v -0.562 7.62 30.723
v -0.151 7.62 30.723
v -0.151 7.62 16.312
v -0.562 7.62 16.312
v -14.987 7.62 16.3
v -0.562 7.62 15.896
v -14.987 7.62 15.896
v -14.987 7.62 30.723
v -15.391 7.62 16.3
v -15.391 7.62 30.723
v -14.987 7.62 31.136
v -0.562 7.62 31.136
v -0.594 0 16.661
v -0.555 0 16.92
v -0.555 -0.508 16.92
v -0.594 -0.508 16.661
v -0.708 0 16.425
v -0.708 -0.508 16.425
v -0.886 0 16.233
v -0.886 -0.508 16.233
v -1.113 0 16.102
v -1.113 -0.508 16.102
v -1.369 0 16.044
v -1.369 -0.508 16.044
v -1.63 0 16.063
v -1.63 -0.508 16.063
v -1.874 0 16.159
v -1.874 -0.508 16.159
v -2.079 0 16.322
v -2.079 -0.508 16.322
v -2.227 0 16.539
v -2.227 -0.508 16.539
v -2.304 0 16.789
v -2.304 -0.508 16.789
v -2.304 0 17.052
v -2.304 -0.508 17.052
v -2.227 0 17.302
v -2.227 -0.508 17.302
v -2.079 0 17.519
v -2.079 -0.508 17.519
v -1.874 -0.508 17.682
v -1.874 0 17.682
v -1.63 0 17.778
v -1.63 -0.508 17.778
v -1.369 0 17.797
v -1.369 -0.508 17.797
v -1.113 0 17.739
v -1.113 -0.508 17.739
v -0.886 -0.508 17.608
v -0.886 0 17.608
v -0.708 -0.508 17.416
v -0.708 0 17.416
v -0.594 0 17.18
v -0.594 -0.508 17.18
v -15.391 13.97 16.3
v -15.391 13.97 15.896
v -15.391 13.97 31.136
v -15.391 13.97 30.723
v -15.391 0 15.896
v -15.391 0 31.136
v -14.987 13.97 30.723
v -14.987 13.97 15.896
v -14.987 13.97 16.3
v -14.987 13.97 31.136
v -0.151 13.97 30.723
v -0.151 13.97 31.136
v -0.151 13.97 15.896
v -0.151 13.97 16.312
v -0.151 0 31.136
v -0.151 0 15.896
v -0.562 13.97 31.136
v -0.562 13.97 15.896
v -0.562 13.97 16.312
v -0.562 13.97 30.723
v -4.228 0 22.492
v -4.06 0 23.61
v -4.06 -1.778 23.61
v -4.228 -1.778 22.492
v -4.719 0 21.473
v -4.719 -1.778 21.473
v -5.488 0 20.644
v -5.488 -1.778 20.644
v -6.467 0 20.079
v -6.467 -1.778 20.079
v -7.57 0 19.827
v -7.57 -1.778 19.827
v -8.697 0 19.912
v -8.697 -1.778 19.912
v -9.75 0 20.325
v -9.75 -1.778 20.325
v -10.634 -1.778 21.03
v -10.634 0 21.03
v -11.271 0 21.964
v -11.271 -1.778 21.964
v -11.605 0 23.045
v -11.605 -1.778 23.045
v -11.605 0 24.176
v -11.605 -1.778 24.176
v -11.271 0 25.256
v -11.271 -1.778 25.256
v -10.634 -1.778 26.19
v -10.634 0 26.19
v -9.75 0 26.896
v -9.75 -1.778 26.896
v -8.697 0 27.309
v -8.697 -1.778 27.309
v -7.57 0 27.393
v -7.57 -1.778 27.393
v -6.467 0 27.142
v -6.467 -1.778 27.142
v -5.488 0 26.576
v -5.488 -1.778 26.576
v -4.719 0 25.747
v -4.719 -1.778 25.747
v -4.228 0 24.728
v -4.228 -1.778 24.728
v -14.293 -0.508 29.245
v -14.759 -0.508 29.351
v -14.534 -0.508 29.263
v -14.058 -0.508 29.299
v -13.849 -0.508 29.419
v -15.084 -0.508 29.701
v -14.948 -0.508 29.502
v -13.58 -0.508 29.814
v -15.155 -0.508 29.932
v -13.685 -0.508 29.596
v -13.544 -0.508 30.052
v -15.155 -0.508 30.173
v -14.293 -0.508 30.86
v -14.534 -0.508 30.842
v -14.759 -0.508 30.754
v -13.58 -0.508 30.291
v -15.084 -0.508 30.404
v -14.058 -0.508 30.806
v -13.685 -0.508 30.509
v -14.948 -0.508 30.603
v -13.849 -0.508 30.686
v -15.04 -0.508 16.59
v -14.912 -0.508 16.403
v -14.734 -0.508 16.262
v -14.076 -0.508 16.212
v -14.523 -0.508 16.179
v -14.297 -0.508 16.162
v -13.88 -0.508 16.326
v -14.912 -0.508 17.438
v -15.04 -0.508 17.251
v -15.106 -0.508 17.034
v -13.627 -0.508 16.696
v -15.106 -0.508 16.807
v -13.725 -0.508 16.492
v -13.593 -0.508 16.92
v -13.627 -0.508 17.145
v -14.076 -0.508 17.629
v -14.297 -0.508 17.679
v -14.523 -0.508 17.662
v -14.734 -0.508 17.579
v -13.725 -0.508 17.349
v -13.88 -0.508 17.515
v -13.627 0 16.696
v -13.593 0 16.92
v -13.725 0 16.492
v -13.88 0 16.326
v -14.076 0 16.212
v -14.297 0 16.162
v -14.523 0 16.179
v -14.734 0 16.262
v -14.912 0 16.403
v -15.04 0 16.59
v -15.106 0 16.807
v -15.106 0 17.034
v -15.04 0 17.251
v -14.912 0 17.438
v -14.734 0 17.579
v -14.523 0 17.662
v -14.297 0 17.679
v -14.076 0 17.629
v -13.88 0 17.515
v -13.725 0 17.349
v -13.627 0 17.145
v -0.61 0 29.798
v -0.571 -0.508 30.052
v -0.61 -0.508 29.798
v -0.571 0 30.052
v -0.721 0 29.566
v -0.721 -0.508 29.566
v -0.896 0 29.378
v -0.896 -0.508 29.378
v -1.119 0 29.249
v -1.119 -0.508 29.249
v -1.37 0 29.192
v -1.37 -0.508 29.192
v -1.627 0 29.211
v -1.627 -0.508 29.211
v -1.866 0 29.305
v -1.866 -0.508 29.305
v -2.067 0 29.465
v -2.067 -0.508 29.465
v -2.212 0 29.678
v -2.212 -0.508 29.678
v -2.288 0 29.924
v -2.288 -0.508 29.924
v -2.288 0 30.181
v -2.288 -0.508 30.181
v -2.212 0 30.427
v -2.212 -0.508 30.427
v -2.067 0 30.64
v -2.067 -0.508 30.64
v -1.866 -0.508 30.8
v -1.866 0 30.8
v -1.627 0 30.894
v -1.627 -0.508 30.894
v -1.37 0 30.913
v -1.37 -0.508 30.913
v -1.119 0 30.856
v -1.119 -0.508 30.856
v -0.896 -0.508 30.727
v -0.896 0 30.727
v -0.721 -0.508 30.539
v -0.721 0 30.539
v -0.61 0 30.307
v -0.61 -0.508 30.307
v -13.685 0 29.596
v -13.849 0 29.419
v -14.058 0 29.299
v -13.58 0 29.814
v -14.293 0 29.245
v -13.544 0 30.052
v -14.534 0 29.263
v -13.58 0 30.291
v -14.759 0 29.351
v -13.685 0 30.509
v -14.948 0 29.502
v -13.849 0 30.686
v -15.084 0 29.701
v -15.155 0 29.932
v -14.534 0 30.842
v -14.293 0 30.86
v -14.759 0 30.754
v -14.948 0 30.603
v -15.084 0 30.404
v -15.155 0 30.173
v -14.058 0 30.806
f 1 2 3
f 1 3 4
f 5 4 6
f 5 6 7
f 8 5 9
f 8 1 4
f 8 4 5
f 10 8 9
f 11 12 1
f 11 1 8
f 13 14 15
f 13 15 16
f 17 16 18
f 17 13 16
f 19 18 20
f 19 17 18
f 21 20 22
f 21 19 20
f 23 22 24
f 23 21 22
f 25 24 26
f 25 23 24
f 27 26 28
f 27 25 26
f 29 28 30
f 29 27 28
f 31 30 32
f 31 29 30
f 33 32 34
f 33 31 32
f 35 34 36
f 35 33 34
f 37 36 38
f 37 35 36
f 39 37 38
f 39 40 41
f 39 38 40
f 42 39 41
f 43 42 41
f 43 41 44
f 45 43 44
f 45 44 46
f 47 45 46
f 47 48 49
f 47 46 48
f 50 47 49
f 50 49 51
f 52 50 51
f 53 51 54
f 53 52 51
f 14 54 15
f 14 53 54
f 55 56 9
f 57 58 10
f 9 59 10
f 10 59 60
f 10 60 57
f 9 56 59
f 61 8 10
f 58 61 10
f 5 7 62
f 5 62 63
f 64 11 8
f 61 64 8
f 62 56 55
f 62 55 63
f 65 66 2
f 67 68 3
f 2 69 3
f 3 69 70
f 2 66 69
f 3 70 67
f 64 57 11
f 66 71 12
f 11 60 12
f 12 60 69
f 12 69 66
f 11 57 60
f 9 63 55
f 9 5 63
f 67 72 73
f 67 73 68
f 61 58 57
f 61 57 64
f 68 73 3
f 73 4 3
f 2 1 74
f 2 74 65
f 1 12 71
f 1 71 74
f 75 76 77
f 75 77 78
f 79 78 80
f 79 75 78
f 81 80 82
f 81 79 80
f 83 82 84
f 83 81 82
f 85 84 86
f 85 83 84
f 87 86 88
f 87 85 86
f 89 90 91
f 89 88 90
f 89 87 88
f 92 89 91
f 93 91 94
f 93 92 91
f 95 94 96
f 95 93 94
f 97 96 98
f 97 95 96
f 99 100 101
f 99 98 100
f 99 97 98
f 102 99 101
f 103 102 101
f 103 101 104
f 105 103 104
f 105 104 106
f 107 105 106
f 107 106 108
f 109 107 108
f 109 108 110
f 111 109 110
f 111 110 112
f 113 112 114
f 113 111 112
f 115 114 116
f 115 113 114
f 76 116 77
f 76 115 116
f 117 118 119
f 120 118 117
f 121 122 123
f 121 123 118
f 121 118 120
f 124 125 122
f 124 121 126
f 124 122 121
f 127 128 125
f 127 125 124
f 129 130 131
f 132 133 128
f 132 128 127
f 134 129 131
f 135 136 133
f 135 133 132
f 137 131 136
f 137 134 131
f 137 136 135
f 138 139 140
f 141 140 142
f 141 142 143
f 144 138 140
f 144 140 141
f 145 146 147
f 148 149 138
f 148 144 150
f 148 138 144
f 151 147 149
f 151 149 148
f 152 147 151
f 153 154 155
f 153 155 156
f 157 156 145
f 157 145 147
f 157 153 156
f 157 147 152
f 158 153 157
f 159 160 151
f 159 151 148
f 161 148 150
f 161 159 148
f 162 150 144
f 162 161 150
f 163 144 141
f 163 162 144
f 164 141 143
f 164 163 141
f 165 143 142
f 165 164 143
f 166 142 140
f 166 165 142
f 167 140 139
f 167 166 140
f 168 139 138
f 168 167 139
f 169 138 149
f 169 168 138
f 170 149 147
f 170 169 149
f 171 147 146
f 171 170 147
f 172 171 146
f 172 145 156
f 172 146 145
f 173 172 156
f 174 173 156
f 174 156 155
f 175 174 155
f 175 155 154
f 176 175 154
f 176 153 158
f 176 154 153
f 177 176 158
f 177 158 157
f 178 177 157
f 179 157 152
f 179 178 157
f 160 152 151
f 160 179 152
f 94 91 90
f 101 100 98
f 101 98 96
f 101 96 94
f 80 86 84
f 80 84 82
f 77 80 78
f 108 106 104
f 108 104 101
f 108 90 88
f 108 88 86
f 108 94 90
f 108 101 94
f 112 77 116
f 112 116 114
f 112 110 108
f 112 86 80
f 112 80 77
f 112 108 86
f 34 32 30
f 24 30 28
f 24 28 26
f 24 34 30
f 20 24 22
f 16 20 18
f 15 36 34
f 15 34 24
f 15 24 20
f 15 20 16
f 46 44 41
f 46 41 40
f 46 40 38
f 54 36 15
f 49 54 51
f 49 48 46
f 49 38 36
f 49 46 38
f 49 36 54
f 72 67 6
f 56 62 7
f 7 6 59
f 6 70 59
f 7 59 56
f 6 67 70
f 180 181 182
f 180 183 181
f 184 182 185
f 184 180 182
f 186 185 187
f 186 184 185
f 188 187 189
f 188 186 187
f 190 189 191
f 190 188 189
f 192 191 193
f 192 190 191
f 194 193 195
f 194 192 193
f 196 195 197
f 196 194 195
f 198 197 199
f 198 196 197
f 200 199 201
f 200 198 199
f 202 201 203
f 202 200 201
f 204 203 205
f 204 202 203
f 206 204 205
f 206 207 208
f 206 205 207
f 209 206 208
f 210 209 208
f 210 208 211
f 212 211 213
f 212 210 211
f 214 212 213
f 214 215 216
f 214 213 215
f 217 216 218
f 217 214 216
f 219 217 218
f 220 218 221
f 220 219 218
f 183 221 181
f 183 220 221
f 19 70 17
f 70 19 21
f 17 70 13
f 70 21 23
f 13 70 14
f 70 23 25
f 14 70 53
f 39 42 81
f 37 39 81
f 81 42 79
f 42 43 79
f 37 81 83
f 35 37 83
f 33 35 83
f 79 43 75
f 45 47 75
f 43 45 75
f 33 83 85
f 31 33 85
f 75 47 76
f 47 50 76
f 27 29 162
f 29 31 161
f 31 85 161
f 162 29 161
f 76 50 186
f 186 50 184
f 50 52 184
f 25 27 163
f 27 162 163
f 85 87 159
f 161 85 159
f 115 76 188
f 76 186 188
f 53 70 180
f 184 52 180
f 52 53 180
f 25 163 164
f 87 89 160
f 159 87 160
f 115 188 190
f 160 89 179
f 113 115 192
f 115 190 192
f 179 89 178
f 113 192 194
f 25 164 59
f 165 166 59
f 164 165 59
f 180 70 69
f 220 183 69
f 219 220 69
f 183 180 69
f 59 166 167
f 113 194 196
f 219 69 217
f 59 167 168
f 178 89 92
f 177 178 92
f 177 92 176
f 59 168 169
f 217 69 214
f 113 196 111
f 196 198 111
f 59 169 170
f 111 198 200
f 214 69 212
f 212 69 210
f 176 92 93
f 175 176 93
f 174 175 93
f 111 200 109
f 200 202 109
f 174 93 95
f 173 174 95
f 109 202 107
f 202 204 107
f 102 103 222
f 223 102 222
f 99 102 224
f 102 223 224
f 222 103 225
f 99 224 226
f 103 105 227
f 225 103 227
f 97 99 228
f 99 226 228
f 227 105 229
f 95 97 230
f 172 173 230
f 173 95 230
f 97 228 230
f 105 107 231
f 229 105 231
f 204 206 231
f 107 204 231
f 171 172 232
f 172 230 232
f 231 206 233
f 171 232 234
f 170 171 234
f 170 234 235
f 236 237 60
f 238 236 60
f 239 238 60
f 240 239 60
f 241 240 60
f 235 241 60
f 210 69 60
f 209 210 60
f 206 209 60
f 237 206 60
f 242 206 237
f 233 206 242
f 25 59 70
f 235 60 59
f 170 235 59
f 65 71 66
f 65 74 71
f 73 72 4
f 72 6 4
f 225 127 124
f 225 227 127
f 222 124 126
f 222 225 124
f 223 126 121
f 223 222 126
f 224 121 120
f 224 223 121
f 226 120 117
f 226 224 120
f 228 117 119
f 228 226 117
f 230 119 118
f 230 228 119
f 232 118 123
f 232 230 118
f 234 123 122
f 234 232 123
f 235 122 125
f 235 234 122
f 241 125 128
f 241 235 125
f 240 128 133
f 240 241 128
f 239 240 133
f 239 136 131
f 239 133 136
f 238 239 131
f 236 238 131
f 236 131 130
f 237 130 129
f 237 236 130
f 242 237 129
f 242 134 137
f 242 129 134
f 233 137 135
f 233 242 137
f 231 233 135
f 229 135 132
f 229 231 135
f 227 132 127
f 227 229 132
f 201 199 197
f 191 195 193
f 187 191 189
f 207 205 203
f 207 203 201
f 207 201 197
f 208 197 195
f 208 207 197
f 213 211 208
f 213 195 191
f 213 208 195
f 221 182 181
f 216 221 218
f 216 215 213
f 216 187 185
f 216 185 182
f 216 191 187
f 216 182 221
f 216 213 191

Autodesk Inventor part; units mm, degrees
ref_plane "YZ Plane" through (0, 0, 0) normal (1, 0, 0) x (0, 1, 0)
ref_plane "XZ Plane" through (0, 0, 0) normal (0, 1, 0) x (-1, 0, 0)
ref_plane "XY Plane" through (0, 0, 0) normal (0, 0, 1) x (1, 0, 0)
sketch "Sketch1" plane through (0, 0, 0) normal (0, 1, 0) x (-1, 0, 0)
  line L0 (15.3914, 31.136) -> (0.1514, 31.136)
  line L1 (0.1514, 31.136) -> (0.1514, 15.896)
  line L2 (0.1514, 15.896) -> (15.3914, 15.896)
  line L3 (15.3914, 15.896) -> (15.3914, 31.136)
  point P0 (0, 0)
  dimension "d0" = 15.24
  dimension "d1" = 15.24
extrude "Extrusion1" add sketch "Sketch1" along normal blind 7.62
sketch "Sketch2" plane through (0, 0, 0) normal (0, -1, 0) x (1, 0, 0)
  circle A0 centre (-7.8533, 23.6101) radius 3.7937
  point P0 (0, 0)
extrude "Extrusion2" add sketch "Sketch2" along normal blind 1.778
sketch "Sketch3" plane through (0, 0, 0) normal (0, -1, 0) x (1, 0, 0)
  circle A0 centre (-1.4346, 30.0524) radius 0.8632
  circle A1 centre (-1.4346, 16.9205) radius 0.8792
  circle A2 centre (-14.354, 30.0524) radius 0.8098
  circle A3 centre (-14.354, 16.9205) radius 0.7609
  point P0 (0, 0)
extrude "Extrusion3" add sketch "Sketch3" along normal blind 0.508
sketch "Sketch4" plane through (0, 7.62, 0) normal (0, 1, 0) x (1, 0, 0)
  line L0 (-15.3914, -15.896) -> (-15.3914, -31.136) projected
  line L1 (-15.3914, -31.136) -> (-14.9868, -31.136)
  line L2 (-14.9868, -31.136) -> (-14.9868, -30.723)
  line L3 (-14.9868, -30.723) -> (-15.3914, -30.723)
  line L4 (-15.3914, -30.723) -> (-15.3914, -31.136)
  line L5 (-0.1514, -15.896) -> (-15.3914, -15.896) projected
  line L6 (-15.3914, -15.896) -> (-14.9868, -15.896)
  line L7 (-14.9868, -15.896) -> (-14.9868, -16.2998)
  line L8 (-14.9868, -16.2998) -> (-15.3914, -16.2998)
  line L9 (-15.3914, -16.2998) -> (-15.3914, -15.896)
  line L10 (-0.1514, -15.896) -> (-0.5623, -15.896)
  line L11 (-0.5623, -15.896) -> (-0.5623, -16.3119)
  line L12 (-0.5623, -16.3119) -> (-0.1514, -16.3119)
  line L13 (-0.1514, -16.3119) -> (-0.1514, -15.896)
  line L14 (-15.3914, -31.136) -> (-0.1514, -31.136) projected
  line L15 (-0.1514, -31.136) -> (-0.5623, -31.136)
  line L16 (-0.5623, -31.136) -> (-0.5623, -30.723)
  line L17 (-0.5623, -30.723) -> (-0.1514, -30.723)
  line L18 (-0.1514, -30.723) -> (-0.1514, -31.136)
  point P0 (0, 0)
extrude "Extrusion4" add sketch "Sketch4" along normal blind 6.35
properties part number "switch"
